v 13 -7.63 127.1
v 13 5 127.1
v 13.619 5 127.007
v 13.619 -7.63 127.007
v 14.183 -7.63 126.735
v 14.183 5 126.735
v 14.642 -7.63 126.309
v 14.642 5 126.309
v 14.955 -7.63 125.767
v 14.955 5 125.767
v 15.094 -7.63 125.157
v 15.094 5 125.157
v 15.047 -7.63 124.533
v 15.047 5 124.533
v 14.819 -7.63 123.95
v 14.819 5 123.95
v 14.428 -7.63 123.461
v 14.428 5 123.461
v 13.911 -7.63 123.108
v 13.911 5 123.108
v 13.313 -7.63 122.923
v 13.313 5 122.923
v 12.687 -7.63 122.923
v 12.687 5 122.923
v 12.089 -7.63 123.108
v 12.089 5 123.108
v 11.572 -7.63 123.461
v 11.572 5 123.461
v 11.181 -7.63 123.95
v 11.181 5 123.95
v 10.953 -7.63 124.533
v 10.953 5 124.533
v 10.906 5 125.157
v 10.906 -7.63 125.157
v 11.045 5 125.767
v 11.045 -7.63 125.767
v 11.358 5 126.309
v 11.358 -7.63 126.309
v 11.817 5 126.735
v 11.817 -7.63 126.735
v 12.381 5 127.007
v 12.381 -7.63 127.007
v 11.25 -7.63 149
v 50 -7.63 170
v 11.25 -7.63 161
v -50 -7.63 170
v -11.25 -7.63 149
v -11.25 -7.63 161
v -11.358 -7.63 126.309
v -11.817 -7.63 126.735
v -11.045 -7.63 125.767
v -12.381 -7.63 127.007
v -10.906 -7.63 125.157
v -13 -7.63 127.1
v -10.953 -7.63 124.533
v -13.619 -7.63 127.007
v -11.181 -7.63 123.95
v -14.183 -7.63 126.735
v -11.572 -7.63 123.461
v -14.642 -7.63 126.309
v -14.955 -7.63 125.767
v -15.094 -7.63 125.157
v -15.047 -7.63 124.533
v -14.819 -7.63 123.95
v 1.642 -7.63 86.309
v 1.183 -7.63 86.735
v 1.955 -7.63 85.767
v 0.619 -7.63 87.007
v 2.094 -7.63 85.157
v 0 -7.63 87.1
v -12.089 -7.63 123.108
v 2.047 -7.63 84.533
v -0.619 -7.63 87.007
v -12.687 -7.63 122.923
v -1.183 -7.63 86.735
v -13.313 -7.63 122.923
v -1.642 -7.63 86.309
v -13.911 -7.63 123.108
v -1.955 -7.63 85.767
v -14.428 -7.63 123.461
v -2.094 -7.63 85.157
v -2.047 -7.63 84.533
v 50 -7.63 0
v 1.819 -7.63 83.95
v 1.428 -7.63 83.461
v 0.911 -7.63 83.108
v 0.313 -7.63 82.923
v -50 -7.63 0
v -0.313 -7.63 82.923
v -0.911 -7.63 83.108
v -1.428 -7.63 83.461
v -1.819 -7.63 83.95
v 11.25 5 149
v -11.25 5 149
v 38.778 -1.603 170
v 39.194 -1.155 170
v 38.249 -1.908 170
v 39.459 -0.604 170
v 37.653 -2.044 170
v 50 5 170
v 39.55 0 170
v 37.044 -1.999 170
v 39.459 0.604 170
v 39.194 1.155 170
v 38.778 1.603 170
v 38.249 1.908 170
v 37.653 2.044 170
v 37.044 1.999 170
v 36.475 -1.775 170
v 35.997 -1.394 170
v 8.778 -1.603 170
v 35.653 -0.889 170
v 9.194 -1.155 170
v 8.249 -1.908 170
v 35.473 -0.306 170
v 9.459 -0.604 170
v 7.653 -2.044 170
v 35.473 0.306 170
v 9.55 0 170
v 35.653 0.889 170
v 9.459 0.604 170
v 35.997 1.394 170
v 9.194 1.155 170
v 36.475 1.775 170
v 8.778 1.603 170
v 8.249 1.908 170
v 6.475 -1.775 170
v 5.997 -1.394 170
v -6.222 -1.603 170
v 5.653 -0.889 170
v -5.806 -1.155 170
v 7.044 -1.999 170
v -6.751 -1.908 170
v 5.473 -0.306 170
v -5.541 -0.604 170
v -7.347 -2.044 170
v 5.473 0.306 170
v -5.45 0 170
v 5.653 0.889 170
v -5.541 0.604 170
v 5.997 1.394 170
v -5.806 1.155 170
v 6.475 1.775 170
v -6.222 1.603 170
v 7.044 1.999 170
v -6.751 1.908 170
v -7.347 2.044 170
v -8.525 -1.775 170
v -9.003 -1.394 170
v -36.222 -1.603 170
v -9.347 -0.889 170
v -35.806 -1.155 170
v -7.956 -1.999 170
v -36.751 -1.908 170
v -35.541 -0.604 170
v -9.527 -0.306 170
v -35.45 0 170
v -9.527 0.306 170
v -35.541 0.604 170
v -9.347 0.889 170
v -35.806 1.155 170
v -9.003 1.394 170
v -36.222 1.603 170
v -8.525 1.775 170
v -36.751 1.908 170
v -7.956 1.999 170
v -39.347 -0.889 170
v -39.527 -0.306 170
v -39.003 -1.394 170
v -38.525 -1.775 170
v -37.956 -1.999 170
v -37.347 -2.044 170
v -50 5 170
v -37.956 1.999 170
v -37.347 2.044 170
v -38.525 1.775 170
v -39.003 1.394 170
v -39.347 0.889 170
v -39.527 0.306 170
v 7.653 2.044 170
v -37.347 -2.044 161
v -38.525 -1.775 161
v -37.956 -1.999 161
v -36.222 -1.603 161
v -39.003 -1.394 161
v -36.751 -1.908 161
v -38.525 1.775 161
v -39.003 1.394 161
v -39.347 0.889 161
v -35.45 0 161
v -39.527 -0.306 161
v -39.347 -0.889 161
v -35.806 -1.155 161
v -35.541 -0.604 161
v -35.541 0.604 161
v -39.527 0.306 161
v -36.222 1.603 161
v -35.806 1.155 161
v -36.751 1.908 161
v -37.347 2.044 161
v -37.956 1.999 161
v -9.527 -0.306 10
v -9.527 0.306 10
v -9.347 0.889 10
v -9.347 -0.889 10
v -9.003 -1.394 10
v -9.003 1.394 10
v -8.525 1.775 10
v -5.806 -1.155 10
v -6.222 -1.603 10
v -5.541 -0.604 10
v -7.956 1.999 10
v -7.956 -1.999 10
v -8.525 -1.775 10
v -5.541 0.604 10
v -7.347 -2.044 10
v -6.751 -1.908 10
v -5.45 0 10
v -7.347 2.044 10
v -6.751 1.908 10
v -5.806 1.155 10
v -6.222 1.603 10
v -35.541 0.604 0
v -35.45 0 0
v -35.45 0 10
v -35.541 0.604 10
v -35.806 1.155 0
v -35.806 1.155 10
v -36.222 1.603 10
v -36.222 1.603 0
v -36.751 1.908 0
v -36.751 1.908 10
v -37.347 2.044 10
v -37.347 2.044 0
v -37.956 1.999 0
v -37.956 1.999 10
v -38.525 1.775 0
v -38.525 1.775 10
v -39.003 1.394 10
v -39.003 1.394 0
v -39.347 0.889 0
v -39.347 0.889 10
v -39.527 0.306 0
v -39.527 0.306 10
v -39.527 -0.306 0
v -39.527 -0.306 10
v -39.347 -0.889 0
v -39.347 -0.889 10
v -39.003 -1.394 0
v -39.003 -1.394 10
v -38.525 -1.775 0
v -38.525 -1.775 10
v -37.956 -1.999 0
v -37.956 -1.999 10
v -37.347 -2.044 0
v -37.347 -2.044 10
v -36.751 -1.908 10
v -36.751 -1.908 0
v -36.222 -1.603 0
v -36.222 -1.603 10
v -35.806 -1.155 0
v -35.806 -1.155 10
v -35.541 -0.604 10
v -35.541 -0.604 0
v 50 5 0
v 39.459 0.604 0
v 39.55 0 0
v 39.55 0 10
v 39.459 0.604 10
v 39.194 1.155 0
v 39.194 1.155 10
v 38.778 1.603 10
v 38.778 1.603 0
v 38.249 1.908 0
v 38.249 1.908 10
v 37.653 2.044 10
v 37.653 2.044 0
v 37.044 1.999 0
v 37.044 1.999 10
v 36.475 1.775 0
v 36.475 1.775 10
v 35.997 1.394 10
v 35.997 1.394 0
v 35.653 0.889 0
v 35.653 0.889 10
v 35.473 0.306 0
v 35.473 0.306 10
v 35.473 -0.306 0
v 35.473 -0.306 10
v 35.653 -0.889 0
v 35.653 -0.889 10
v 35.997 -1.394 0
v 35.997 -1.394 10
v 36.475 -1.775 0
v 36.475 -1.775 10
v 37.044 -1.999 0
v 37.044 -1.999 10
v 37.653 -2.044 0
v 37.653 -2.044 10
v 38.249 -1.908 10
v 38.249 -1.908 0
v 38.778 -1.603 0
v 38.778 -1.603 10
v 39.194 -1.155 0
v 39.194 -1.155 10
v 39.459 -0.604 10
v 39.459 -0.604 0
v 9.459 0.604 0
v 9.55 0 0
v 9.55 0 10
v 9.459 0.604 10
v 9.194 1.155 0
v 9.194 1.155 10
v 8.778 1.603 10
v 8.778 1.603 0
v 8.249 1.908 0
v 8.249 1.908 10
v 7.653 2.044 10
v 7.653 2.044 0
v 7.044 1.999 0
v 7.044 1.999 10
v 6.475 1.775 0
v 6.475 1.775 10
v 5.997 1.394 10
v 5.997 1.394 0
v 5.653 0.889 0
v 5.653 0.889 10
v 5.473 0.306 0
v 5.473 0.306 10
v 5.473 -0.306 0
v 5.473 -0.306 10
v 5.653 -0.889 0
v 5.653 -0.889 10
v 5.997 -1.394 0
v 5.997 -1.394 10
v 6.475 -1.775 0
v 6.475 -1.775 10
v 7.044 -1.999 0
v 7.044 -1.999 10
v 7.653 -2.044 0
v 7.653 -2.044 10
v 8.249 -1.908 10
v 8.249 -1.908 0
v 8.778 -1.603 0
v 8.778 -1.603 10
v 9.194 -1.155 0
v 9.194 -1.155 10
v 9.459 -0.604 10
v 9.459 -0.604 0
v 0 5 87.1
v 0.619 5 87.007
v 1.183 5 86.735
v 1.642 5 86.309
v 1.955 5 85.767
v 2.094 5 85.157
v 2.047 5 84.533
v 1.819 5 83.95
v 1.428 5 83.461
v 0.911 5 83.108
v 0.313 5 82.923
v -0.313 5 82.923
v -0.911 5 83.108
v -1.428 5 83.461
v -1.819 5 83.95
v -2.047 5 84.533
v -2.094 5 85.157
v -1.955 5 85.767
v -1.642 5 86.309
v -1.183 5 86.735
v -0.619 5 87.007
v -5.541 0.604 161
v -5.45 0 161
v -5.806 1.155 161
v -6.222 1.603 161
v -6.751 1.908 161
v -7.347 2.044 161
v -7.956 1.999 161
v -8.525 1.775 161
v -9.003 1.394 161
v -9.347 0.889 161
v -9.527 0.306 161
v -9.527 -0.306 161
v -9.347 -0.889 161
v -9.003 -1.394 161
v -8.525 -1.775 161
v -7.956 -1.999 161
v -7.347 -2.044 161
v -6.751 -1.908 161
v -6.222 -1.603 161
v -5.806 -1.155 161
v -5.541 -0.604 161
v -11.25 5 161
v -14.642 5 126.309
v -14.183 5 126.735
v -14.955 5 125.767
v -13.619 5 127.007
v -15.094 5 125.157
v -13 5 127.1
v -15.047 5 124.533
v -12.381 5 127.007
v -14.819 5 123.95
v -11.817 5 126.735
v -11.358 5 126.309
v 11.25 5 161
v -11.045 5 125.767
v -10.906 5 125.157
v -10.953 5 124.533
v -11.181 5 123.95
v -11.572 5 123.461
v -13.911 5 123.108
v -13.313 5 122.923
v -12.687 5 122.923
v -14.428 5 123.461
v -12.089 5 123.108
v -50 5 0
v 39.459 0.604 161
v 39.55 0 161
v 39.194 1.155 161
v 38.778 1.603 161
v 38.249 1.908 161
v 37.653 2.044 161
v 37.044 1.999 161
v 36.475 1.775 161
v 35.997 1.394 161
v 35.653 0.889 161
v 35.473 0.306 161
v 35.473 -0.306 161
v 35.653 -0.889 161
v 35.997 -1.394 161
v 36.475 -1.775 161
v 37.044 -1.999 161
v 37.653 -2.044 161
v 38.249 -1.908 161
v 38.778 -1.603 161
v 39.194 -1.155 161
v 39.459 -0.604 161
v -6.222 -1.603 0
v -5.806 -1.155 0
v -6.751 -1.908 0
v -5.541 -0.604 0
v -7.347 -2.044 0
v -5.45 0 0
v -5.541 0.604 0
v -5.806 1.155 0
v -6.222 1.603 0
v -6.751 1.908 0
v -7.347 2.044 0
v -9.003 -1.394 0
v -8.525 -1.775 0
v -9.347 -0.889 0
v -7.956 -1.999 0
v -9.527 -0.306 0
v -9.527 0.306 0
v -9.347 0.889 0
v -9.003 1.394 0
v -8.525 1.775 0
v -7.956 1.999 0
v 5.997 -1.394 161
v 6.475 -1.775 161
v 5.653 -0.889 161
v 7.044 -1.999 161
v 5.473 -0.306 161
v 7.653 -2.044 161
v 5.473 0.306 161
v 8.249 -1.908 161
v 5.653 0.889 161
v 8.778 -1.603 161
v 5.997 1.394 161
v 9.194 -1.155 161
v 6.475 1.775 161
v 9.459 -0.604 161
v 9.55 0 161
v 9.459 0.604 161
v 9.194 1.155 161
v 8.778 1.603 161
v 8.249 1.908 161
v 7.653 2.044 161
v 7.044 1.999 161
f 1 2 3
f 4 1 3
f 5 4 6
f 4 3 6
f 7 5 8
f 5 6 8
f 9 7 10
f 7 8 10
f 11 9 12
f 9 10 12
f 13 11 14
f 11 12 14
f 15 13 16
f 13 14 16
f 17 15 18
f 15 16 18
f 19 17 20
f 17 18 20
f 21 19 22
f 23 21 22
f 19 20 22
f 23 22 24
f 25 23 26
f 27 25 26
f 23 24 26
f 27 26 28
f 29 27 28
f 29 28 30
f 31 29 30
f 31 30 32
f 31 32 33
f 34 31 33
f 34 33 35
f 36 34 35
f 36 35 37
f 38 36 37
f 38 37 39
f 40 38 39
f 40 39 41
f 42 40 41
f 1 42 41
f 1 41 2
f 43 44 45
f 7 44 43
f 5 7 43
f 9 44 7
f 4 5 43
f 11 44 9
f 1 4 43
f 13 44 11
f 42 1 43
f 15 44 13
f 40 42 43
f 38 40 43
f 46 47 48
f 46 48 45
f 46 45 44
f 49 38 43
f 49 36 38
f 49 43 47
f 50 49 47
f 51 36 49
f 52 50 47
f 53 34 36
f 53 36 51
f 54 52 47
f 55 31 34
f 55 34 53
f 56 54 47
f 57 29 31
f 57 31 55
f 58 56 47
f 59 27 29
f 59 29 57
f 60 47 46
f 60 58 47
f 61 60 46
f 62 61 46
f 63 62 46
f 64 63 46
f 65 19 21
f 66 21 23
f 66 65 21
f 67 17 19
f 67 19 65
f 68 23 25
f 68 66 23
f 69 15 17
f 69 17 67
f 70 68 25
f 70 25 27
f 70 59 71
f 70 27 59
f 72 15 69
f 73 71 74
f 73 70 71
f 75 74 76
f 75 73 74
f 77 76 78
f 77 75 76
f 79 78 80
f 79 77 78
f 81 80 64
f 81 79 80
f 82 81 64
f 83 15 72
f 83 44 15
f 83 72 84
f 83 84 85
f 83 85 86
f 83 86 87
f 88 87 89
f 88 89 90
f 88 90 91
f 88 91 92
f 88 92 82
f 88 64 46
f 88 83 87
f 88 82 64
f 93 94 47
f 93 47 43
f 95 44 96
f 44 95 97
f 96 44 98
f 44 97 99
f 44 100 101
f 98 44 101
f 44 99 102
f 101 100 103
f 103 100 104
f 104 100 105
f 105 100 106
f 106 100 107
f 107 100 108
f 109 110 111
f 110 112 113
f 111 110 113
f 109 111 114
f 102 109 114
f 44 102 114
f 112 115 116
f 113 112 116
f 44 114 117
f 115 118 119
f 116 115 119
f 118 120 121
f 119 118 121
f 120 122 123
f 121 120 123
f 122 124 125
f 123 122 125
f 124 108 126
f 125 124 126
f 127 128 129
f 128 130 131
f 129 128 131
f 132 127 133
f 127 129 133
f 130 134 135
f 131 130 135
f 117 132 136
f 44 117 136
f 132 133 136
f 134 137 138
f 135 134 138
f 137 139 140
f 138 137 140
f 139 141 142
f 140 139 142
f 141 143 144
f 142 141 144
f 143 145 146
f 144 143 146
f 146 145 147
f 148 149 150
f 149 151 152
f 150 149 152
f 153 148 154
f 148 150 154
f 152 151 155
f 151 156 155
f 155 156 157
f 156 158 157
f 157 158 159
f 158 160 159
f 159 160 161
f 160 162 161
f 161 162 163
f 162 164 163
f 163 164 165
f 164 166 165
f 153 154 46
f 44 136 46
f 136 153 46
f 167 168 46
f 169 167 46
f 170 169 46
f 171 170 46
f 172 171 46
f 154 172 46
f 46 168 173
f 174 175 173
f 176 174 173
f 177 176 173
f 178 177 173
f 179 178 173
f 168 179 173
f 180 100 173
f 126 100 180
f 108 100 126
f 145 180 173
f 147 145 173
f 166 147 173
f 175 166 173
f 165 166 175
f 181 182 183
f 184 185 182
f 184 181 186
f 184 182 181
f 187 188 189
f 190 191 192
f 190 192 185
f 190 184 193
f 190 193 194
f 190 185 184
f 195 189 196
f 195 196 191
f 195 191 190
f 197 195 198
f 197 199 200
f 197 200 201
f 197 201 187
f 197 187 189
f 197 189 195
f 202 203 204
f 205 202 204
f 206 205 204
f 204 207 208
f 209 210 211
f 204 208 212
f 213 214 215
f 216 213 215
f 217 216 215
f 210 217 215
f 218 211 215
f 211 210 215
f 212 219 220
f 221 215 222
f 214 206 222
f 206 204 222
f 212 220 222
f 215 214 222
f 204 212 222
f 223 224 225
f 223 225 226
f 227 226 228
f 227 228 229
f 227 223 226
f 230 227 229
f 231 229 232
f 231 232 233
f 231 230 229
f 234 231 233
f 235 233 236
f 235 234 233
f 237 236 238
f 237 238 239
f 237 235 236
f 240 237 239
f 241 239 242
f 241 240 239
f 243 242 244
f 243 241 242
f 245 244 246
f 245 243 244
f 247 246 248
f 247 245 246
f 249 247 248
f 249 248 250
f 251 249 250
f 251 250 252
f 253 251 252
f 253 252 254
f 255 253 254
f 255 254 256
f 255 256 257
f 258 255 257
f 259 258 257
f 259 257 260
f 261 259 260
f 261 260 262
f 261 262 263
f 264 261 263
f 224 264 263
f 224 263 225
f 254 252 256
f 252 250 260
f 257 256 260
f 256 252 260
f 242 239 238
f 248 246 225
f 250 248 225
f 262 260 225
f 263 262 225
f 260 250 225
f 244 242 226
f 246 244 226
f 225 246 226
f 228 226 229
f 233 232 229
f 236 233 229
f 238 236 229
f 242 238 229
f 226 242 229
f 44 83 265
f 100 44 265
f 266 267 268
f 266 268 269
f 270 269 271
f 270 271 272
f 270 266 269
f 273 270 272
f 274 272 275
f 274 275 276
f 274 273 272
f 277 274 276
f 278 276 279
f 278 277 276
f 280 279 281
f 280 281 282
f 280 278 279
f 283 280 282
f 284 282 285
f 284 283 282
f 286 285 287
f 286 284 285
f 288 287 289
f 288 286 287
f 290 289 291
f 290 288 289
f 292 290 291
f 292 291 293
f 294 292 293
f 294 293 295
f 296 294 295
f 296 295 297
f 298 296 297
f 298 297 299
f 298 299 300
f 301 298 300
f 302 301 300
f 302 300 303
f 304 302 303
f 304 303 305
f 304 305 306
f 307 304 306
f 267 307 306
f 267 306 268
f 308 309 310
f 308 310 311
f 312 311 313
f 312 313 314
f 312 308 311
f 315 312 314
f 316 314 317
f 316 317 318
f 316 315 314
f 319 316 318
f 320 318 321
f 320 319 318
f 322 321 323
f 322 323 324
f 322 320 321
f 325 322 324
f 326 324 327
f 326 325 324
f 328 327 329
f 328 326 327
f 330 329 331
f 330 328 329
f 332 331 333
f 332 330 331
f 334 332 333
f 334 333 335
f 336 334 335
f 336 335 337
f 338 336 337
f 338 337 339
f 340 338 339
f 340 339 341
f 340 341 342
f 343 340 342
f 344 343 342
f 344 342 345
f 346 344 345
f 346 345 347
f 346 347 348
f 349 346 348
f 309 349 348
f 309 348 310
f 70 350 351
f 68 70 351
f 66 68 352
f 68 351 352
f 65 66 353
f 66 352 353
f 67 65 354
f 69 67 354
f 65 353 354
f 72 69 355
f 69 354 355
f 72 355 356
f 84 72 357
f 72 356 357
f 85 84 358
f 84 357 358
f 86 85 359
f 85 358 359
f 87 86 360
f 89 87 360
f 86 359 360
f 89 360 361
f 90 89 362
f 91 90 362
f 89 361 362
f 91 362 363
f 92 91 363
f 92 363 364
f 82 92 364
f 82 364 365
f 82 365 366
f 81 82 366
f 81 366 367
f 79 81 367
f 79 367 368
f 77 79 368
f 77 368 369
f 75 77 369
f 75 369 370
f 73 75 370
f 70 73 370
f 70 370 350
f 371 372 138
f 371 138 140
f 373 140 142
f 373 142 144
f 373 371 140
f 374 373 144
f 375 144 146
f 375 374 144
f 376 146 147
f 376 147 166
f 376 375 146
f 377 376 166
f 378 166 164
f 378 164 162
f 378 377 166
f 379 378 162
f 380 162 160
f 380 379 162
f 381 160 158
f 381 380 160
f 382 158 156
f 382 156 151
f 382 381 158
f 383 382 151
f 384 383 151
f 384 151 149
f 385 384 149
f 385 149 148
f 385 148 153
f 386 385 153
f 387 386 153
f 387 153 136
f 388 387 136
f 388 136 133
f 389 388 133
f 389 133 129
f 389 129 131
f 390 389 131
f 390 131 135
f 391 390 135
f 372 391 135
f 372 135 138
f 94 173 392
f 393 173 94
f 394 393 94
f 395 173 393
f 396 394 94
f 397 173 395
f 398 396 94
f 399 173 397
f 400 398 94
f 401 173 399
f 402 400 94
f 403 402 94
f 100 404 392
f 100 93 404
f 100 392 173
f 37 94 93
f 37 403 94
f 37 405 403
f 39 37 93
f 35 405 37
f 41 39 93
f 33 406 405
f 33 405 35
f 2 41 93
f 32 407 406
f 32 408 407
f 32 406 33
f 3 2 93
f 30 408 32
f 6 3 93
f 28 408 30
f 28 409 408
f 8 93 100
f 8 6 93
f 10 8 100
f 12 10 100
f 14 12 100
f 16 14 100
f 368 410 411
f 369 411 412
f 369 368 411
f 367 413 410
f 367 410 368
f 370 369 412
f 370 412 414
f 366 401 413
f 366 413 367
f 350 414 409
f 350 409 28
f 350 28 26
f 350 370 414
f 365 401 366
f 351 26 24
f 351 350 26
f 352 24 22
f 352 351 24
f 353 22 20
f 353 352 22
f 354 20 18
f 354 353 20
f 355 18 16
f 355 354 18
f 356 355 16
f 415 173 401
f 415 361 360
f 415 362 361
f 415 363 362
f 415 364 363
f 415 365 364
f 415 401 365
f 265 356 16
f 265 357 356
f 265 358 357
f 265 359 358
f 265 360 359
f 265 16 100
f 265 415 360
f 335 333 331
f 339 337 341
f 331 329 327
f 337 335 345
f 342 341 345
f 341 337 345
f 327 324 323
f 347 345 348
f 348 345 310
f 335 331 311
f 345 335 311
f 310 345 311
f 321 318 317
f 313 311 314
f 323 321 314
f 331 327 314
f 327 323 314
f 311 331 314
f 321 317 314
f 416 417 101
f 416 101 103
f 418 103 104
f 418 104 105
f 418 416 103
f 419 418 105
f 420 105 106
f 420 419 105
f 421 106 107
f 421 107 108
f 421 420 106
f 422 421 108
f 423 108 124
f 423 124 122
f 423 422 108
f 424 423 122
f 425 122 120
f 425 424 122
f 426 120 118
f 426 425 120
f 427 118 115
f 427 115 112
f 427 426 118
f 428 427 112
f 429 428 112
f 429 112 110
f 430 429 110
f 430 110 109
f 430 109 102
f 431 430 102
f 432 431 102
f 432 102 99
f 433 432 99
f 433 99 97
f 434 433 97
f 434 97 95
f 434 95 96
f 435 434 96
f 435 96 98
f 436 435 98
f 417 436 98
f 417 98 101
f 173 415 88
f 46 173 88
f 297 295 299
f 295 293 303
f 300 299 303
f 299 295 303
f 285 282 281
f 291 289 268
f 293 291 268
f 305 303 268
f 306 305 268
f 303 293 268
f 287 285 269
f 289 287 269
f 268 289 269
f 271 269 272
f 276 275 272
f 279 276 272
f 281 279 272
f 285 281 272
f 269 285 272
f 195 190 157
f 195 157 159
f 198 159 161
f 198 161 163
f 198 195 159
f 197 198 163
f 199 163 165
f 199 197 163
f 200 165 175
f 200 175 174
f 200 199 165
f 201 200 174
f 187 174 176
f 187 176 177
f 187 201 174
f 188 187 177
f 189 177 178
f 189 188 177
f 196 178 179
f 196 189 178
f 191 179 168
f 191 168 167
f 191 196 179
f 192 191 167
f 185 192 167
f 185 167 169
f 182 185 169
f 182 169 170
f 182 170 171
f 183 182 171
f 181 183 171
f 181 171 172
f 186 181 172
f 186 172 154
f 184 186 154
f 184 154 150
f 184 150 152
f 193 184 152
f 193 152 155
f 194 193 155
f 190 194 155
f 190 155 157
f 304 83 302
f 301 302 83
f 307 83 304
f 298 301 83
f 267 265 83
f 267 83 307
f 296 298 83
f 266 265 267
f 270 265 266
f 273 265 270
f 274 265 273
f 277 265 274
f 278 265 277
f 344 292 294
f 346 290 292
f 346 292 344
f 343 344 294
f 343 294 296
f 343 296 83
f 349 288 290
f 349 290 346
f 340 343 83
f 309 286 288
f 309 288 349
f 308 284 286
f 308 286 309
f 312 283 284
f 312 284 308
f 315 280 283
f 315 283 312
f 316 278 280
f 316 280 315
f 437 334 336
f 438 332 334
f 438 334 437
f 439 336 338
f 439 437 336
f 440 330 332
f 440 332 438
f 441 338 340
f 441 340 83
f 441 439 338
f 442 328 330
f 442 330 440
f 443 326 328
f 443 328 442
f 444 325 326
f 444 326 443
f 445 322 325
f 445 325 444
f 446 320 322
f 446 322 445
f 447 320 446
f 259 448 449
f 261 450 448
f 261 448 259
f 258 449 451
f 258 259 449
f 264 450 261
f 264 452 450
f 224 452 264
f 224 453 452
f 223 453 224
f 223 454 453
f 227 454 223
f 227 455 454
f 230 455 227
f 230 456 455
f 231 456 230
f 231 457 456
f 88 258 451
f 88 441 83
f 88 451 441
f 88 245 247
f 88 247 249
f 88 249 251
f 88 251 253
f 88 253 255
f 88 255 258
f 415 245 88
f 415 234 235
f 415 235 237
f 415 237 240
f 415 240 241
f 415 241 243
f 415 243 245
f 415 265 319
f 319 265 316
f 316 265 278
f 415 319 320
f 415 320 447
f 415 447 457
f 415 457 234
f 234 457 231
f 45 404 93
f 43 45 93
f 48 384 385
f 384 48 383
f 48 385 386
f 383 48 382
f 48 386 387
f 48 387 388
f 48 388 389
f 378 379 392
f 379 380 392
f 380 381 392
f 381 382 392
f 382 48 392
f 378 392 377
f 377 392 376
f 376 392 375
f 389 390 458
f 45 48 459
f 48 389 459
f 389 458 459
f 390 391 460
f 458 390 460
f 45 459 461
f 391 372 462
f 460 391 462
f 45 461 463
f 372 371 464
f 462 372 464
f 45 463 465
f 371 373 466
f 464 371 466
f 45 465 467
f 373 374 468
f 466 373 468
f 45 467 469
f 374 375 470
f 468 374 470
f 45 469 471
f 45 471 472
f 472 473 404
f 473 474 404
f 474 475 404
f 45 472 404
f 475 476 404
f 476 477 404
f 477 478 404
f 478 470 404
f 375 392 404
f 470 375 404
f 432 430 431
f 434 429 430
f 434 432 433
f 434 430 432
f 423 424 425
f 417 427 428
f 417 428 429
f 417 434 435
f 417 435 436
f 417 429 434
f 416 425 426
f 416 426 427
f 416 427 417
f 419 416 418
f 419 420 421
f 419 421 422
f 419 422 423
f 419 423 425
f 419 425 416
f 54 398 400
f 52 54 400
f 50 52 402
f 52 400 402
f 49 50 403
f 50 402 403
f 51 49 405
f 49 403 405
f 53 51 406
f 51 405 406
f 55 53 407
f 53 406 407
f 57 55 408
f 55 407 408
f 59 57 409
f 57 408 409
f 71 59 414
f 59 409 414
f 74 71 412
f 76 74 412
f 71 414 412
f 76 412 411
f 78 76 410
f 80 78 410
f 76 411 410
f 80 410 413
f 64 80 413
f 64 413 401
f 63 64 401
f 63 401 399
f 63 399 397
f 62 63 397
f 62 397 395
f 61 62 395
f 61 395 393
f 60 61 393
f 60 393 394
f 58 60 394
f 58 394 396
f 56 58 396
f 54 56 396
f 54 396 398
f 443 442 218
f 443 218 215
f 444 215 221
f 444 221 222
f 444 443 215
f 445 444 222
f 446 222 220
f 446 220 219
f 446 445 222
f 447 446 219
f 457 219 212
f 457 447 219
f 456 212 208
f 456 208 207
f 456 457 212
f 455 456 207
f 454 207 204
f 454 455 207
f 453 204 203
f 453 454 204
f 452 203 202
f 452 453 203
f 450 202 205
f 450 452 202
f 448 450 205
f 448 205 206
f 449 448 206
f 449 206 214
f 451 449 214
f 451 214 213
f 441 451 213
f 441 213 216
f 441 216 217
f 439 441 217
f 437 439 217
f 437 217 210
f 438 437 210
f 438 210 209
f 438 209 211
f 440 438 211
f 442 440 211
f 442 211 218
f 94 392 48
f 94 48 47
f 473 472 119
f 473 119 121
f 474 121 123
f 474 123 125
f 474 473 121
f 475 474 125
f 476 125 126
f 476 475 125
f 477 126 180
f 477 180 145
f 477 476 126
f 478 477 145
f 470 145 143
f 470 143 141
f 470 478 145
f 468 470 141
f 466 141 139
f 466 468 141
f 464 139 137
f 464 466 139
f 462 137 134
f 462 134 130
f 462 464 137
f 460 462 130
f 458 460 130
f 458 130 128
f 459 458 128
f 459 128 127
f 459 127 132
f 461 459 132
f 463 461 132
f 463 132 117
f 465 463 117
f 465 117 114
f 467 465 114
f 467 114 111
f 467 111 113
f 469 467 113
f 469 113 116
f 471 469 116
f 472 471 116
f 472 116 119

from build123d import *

# Parameters (mm, degrees)
SKETCH1_R           = 2.05
BOSS_EXTRUDE1_DEPTH = 170
BOSS_EXTRUDE3_START = 10
SKETCH1_3_R         = 2.05
BOSS_EXTRUDE3_DEPTH = 151
SKETCH3_R           = 2.1
SKETCH3_W           = 22.5
SKETCH3_H           = 12
CUT_EXTRUDE1_DEPTH  = 178.649984239


with BuildPart() as part:
    # Sketch1 → Boss-Extrude1 (new body)
    with BuildSketch(Plane.XY):
        Polygon((-50, 5), (50, 5), (50, -5), (50, -7.63), (-50, -7.63), (-50, -5), align=None)
        with Locations((-37.5, 0)):
            Circle(SKETCH1_R, mode=Mode.SUBTRACT)
        with Locations((-7.5, 0)):
            Circle(SKETCH1_R, mode=Mode.SUBTRACT)
        with Locations((7.5, 0)):
            Circle(SKETCH1_R, mode=Mode.SUBTRACT)
        with Locations((37.5, 0)):
            Circle(SKETCH1_R, mode=Mode.SUBTRACT)
    extrude(amount=BOSS_EXTRUDE1_DEPTH)

    # Sketch1<3> → Boss-Extrude3 (add)
    with BuildSketch(Plane.XY.offset(BOSS_EXTRUDE3_START)):
        with Locations((-37.5, 0)):
            Circle(SKETCH1_3_R)
        with Locations((-7.5, 0)):
            Circle(SKETCH1_3_R)
        with Locations((7.5, 0)):
            Circle(SKETCH1_3_R)
        with Locations((37.5, 0)):
            Circle(SKETCH1_3_R)
    extrude(amount=BOSS_EXTRUDE3_DEPTH)

    # Sketch3 → Cut-Extrude1 (cut, through all)
    with BuildSketch(Plane(origin=(0, 5, 0), x_dir=(1, 0, 0), z_dir=(0, 1, 0))):
        with Locations(Location((0, -85, 0), (0, 0, 270))):
            Circle(SKETCH3_R)
        with Locations(Location((13, -125, 0), (0, 0, 270))):
            Circle(SKETCH3_R)
        with Locations(Location((-13, -125, 0), (0, 0, 270))):
            Circle(SKETCH3_R)
        with Locations((0, -155)):
            Rectangle(SKETCH3_W, SKETCH3_H)
    extrude(amount=-CUT_EXTRUDE1_DEPTH, mode=Mode.SUBTRACT)


solid = part.part
